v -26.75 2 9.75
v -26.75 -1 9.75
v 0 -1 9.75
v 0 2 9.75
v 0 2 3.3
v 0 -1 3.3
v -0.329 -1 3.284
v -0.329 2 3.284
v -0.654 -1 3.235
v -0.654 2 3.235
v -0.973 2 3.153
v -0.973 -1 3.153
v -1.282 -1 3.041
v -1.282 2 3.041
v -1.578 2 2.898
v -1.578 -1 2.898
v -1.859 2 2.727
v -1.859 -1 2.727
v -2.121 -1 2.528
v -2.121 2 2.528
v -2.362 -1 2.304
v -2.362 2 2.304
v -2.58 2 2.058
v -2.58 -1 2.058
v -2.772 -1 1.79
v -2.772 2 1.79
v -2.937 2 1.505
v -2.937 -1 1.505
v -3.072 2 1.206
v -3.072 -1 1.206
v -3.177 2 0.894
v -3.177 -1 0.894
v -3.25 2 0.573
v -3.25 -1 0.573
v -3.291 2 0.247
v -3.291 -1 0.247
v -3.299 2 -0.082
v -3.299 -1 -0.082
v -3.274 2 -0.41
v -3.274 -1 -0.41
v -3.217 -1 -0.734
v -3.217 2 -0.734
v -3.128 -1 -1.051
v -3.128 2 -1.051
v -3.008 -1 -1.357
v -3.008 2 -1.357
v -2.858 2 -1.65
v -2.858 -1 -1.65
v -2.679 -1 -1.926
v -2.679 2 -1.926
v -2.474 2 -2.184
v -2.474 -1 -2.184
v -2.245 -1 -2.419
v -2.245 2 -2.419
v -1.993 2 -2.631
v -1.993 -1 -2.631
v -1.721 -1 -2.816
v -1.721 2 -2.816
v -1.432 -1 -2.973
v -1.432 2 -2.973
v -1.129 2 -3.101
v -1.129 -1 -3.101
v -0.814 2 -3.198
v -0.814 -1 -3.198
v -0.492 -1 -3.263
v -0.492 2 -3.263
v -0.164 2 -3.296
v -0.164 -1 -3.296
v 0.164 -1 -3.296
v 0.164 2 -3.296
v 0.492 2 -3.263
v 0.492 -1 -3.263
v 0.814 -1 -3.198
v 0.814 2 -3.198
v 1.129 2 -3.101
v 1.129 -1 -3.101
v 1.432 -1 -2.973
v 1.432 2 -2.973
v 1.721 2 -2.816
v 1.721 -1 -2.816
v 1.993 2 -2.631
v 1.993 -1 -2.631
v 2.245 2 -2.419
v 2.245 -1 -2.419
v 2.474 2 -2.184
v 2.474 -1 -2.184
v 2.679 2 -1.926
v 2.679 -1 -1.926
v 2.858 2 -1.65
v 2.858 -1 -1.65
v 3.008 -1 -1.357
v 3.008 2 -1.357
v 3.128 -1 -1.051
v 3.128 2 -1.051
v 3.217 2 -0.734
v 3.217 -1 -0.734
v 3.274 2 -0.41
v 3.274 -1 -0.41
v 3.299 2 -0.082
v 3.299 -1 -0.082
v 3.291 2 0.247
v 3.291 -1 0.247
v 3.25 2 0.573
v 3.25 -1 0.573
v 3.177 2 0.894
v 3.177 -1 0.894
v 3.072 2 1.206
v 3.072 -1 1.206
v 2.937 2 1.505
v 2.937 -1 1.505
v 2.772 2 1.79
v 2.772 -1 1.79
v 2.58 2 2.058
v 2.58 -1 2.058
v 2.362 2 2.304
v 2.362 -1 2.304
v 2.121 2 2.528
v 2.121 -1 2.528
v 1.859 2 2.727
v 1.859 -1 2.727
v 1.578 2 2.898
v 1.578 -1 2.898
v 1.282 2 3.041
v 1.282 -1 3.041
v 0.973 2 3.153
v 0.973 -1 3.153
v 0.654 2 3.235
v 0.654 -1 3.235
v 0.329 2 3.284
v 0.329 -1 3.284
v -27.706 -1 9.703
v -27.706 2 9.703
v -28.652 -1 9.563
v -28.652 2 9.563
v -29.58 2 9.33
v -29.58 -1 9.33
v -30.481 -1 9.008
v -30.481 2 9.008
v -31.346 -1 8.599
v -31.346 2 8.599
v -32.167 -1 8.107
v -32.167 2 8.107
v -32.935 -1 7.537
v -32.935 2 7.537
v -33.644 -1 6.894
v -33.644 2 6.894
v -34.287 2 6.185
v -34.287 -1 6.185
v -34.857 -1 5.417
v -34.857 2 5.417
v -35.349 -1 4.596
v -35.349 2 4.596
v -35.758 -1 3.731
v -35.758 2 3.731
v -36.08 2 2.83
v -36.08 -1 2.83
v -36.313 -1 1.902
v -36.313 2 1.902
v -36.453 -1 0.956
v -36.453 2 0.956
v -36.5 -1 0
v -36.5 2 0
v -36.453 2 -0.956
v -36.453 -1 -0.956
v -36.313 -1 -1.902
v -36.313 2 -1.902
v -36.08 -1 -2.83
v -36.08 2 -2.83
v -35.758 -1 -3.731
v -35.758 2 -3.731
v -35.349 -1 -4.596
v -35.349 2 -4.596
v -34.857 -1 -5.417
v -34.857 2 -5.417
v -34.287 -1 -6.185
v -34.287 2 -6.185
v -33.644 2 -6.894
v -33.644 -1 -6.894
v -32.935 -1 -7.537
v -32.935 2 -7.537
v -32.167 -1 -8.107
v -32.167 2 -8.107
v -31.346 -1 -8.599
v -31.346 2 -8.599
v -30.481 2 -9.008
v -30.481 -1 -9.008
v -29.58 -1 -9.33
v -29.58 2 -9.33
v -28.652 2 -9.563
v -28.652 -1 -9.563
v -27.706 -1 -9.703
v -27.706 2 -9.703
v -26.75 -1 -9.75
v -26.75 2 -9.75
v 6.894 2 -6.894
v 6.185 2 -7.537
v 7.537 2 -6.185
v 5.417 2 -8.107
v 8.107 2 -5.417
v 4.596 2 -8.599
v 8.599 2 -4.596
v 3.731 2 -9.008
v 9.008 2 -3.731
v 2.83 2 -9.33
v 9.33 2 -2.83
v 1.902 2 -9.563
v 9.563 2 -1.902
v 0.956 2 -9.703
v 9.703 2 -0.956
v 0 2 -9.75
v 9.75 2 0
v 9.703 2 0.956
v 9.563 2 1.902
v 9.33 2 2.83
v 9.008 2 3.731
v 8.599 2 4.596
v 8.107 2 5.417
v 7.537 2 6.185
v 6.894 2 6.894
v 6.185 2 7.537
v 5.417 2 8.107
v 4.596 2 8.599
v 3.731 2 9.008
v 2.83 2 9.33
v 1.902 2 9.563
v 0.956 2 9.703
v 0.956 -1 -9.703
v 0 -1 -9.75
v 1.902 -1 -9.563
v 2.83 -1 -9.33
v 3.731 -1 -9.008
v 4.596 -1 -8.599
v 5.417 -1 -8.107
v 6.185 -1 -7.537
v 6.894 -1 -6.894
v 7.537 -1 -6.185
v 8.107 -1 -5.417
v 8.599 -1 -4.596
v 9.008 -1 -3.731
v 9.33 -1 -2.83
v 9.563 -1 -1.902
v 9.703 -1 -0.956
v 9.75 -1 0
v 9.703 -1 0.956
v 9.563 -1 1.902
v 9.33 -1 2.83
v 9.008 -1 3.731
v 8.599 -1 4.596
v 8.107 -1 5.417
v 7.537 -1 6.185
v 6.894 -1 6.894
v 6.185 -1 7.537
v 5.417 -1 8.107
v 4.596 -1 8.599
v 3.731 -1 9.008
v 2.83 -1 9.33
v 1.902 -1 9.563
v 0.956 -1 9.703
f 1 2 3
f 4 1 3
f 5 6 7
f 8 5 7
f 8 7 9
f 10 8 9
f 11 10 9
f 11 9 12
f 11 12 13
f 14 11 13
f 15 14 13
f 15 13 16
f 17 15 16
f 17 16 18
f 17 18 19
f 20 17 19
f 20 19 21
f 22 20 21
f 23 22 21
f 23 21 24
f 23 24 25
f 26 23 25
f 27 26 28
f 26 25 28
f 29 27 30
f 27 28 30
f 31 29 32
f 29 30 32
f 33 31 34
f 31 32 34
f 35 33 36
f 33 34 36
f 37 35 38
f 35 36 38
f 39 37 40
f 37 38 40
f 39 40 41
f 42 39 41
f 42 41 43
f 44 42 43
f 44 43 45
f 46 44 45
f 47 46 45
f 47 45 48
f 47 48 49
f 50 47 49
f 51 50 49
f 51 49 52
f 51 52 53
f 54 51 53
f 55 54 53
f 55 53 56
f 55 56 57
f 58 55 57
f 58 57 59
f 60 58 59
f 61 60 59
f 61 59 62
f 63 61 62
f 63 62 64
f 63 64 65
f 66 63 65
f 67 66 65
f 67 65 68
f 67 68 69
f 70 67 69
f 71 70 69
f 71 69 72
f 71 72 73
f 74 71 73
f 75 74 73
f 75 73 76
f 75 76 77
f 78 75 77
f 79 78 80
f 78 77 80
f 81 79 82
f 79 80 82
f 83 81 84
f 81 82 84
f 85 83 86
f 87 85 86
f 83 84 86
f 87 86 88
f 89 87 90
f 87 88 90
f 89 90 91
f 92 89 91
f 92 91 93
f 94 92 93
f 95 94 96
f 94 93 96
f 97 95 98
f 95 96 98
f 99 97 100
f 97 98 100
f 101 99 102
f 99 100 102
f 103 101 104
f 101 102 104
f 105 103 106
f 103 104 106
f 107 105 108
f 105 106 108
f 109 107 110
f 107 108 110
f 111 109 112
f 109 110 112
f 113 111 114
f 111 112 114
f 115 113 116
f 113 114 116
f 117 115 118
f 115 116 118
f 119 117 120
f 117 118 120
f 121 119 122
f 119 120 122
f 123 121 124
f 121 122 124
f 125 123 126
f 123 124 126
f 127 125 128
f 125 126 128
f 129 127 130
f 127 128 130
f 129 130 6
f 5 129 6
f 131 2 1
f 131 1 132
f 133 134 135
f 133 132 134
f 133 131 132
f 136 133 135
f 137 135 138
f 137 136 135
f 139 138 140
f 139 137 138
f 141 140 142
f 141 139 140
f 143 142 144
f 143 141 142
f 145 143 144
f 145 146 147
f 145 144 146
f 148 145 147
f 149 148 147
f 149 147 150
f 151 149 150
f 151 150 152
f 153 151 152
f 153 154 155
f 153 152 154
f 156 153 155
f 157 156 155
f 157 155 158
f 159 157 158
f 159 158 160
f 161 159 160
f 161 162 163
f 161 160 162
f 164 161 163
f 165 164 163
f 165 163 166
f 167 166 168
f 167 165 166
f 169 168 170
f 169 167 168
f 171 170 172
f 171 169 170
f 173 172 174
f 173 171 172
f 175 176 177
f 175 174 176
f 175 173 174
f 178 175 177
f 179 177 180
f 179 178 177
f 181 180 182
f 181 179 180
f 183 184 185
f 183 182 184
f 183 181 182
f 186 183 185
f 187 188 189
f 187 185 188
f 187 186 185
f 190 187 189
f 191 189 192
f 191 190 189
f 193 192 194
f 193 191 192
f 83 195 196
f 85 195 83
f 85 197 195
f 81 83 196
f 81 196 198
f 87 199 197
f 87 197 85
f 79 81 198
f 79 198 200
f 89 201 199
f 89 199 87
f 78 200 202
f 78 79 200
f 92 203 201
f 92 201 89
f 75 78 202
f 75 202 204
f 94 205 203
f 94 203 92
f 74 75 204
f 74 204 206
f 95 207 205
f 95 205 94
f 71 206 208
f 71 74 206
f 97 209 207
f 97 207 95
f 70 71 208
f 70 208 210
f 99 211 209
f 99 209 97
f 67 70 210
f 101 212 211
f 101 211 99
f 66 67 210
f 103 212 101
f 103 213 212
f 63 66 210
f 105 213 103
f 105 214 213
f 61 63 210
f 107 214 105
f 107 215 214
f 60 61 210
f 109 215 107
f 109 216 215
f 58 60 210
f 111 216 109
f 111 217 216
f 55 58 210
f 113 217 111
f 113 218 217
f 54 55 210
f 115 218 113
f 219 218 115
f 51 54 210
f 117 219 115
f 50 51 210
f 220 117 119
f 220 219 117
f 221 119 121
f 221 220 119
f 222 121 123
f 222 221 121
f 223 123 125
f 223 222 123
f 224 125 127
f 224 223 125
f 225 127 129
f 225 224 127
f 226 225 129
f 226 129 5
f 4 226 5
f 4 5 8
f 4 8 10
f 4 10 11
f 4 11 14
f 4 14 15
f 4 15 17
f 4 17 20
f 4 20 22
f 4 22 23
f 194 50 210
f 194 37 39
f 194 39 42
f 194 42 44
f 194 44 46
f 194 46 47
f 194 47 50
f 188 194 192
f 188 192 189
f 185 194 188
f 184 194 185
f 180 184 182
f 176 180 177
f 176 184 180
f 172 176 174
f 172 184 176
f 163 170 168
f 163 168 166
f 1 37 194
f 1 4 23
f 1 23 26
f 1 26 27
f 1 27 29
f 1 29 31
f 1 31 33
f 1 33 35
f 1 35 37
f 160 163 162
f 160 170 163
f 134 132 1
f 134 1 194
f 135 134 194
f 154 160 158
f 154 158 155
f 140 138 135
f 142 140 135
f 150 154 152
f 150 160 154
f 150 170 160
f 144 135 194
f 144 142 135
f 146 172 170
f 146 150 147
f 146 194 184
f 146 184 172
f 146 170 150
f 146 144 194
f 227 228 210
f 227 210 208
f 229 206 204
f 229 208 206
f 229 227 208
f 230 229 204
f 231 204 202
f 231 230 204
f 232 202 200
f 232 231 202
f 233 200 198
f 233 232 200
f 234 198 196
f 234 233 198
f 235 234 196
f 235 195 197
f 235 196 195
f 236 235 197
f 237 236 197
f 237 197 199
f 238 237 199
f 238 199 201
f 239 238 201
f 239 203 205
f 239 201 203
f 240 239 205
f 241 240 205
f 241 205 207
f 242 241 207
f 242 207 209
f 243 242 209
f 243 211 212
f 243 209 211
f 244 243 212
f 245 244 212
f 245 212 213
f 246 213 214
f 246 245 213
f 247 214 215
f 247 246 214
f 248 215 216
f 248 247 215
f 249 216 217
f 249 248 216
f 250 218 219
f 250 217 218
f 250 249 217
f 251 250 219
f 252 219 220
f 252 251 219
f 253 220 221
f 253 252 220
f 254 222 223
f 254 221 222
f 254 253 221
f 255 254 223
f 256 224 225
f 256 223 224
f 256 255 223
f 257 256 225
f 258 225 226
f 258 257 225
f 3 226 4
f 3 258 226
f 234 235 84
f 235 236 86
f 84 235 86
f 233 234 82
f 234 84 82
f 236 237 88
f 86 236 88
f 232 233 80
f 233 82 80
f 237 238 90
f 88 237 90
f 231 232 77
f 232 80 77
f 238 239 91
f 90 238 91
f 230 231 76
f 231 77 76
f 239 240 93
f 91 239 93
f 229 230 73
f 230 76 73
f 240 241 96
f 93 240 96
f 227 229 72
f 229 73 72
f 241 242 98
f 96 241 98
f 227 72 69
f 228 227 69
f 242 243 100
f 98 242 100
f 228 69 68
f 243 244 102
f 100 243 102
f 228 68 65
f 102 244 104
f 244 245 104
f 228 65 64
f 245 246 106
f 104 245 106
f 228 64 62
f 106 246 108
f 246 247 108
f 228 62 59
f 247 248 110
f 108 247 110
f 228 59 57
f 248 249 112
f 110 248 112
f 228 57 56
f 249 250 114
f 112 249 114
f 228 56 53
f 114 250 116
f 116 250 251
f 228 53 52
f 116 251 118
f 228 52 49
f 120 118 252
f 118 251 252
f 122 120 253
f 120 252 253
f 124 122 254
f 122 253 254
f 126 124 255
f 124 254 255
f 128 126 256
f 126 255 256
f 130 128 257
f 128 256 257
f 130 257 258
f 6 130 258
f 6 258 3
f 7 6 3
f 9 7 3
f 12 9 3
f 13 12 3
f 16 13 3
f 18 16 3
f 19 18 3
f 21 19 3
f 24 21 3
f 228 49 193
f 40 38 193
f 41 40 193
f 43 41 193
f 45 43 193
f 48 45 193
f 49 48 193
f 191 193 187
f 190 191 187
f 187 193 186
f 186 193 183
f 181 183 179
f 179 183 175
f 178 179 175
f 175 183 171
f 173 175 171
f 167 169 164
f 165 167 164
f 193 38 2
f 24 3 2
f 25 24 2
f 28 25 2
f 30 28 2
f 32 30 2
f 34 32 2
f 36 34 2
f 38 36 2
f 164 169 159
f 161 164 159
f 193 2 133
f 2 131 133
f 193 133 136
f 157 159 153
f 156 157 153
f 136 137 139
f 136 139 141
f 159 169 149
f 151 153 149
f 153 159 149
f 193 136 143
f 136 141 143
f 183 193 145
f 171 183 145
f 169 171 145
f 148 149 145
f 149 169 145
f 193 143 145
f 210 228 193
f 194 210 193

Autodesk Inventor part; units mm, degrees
ref_plane "YZ Plane" through (0, 0, 0) normal (1, 0, 0) x (0, 1, 0)
ref_plane "XZ Plane" through (0, 0, 0) normal (0, 1, 0) x (-1, 0, 0)
ref_plane "XY Plane" through (0, 0, 0) normal (0, 0, 1) x (1, 0, 0)
sketch "Sketch1" plane through (0, 0, 0) normal (0, 1, 0) x (-1, 0, 0)
  line L0 (0, 0) -> (26.75, 0) construction
  line L1 (0, -9.75) -> (26.75, -9.75)
  line L2 (26.75, 9.75) -> (0, 9.75)
  arc A0 (0, 9.75) -> (0, -9.75) centre (0, 0) ccw
  arc A1 (26.75, -9.75) -> (26.75, 9.75) centre (26.75, 0) ccw
  point P0 (13.375, 0)
  dimension "d0" = 26.75
  dimension "d1" = 19.5
extrude "Extrusion1" add sketch "Sketch1" along normal blind 2 and the other way blind 1
sketch "Sketch2" plane through (0, 2, 0) normal (0, 1, 0) x (1, 0, 0)
  point P0 (0, 0)
hole "Hole1" at (0, 2, 0) direction (0, -1, 0) diameter 6.6 end up to surface clearance for "Countersunk Flat Head Screw ISO 2009/7046" size "M6" standard "ISO"
properties part number "SP36V1 Traba Cierre"
